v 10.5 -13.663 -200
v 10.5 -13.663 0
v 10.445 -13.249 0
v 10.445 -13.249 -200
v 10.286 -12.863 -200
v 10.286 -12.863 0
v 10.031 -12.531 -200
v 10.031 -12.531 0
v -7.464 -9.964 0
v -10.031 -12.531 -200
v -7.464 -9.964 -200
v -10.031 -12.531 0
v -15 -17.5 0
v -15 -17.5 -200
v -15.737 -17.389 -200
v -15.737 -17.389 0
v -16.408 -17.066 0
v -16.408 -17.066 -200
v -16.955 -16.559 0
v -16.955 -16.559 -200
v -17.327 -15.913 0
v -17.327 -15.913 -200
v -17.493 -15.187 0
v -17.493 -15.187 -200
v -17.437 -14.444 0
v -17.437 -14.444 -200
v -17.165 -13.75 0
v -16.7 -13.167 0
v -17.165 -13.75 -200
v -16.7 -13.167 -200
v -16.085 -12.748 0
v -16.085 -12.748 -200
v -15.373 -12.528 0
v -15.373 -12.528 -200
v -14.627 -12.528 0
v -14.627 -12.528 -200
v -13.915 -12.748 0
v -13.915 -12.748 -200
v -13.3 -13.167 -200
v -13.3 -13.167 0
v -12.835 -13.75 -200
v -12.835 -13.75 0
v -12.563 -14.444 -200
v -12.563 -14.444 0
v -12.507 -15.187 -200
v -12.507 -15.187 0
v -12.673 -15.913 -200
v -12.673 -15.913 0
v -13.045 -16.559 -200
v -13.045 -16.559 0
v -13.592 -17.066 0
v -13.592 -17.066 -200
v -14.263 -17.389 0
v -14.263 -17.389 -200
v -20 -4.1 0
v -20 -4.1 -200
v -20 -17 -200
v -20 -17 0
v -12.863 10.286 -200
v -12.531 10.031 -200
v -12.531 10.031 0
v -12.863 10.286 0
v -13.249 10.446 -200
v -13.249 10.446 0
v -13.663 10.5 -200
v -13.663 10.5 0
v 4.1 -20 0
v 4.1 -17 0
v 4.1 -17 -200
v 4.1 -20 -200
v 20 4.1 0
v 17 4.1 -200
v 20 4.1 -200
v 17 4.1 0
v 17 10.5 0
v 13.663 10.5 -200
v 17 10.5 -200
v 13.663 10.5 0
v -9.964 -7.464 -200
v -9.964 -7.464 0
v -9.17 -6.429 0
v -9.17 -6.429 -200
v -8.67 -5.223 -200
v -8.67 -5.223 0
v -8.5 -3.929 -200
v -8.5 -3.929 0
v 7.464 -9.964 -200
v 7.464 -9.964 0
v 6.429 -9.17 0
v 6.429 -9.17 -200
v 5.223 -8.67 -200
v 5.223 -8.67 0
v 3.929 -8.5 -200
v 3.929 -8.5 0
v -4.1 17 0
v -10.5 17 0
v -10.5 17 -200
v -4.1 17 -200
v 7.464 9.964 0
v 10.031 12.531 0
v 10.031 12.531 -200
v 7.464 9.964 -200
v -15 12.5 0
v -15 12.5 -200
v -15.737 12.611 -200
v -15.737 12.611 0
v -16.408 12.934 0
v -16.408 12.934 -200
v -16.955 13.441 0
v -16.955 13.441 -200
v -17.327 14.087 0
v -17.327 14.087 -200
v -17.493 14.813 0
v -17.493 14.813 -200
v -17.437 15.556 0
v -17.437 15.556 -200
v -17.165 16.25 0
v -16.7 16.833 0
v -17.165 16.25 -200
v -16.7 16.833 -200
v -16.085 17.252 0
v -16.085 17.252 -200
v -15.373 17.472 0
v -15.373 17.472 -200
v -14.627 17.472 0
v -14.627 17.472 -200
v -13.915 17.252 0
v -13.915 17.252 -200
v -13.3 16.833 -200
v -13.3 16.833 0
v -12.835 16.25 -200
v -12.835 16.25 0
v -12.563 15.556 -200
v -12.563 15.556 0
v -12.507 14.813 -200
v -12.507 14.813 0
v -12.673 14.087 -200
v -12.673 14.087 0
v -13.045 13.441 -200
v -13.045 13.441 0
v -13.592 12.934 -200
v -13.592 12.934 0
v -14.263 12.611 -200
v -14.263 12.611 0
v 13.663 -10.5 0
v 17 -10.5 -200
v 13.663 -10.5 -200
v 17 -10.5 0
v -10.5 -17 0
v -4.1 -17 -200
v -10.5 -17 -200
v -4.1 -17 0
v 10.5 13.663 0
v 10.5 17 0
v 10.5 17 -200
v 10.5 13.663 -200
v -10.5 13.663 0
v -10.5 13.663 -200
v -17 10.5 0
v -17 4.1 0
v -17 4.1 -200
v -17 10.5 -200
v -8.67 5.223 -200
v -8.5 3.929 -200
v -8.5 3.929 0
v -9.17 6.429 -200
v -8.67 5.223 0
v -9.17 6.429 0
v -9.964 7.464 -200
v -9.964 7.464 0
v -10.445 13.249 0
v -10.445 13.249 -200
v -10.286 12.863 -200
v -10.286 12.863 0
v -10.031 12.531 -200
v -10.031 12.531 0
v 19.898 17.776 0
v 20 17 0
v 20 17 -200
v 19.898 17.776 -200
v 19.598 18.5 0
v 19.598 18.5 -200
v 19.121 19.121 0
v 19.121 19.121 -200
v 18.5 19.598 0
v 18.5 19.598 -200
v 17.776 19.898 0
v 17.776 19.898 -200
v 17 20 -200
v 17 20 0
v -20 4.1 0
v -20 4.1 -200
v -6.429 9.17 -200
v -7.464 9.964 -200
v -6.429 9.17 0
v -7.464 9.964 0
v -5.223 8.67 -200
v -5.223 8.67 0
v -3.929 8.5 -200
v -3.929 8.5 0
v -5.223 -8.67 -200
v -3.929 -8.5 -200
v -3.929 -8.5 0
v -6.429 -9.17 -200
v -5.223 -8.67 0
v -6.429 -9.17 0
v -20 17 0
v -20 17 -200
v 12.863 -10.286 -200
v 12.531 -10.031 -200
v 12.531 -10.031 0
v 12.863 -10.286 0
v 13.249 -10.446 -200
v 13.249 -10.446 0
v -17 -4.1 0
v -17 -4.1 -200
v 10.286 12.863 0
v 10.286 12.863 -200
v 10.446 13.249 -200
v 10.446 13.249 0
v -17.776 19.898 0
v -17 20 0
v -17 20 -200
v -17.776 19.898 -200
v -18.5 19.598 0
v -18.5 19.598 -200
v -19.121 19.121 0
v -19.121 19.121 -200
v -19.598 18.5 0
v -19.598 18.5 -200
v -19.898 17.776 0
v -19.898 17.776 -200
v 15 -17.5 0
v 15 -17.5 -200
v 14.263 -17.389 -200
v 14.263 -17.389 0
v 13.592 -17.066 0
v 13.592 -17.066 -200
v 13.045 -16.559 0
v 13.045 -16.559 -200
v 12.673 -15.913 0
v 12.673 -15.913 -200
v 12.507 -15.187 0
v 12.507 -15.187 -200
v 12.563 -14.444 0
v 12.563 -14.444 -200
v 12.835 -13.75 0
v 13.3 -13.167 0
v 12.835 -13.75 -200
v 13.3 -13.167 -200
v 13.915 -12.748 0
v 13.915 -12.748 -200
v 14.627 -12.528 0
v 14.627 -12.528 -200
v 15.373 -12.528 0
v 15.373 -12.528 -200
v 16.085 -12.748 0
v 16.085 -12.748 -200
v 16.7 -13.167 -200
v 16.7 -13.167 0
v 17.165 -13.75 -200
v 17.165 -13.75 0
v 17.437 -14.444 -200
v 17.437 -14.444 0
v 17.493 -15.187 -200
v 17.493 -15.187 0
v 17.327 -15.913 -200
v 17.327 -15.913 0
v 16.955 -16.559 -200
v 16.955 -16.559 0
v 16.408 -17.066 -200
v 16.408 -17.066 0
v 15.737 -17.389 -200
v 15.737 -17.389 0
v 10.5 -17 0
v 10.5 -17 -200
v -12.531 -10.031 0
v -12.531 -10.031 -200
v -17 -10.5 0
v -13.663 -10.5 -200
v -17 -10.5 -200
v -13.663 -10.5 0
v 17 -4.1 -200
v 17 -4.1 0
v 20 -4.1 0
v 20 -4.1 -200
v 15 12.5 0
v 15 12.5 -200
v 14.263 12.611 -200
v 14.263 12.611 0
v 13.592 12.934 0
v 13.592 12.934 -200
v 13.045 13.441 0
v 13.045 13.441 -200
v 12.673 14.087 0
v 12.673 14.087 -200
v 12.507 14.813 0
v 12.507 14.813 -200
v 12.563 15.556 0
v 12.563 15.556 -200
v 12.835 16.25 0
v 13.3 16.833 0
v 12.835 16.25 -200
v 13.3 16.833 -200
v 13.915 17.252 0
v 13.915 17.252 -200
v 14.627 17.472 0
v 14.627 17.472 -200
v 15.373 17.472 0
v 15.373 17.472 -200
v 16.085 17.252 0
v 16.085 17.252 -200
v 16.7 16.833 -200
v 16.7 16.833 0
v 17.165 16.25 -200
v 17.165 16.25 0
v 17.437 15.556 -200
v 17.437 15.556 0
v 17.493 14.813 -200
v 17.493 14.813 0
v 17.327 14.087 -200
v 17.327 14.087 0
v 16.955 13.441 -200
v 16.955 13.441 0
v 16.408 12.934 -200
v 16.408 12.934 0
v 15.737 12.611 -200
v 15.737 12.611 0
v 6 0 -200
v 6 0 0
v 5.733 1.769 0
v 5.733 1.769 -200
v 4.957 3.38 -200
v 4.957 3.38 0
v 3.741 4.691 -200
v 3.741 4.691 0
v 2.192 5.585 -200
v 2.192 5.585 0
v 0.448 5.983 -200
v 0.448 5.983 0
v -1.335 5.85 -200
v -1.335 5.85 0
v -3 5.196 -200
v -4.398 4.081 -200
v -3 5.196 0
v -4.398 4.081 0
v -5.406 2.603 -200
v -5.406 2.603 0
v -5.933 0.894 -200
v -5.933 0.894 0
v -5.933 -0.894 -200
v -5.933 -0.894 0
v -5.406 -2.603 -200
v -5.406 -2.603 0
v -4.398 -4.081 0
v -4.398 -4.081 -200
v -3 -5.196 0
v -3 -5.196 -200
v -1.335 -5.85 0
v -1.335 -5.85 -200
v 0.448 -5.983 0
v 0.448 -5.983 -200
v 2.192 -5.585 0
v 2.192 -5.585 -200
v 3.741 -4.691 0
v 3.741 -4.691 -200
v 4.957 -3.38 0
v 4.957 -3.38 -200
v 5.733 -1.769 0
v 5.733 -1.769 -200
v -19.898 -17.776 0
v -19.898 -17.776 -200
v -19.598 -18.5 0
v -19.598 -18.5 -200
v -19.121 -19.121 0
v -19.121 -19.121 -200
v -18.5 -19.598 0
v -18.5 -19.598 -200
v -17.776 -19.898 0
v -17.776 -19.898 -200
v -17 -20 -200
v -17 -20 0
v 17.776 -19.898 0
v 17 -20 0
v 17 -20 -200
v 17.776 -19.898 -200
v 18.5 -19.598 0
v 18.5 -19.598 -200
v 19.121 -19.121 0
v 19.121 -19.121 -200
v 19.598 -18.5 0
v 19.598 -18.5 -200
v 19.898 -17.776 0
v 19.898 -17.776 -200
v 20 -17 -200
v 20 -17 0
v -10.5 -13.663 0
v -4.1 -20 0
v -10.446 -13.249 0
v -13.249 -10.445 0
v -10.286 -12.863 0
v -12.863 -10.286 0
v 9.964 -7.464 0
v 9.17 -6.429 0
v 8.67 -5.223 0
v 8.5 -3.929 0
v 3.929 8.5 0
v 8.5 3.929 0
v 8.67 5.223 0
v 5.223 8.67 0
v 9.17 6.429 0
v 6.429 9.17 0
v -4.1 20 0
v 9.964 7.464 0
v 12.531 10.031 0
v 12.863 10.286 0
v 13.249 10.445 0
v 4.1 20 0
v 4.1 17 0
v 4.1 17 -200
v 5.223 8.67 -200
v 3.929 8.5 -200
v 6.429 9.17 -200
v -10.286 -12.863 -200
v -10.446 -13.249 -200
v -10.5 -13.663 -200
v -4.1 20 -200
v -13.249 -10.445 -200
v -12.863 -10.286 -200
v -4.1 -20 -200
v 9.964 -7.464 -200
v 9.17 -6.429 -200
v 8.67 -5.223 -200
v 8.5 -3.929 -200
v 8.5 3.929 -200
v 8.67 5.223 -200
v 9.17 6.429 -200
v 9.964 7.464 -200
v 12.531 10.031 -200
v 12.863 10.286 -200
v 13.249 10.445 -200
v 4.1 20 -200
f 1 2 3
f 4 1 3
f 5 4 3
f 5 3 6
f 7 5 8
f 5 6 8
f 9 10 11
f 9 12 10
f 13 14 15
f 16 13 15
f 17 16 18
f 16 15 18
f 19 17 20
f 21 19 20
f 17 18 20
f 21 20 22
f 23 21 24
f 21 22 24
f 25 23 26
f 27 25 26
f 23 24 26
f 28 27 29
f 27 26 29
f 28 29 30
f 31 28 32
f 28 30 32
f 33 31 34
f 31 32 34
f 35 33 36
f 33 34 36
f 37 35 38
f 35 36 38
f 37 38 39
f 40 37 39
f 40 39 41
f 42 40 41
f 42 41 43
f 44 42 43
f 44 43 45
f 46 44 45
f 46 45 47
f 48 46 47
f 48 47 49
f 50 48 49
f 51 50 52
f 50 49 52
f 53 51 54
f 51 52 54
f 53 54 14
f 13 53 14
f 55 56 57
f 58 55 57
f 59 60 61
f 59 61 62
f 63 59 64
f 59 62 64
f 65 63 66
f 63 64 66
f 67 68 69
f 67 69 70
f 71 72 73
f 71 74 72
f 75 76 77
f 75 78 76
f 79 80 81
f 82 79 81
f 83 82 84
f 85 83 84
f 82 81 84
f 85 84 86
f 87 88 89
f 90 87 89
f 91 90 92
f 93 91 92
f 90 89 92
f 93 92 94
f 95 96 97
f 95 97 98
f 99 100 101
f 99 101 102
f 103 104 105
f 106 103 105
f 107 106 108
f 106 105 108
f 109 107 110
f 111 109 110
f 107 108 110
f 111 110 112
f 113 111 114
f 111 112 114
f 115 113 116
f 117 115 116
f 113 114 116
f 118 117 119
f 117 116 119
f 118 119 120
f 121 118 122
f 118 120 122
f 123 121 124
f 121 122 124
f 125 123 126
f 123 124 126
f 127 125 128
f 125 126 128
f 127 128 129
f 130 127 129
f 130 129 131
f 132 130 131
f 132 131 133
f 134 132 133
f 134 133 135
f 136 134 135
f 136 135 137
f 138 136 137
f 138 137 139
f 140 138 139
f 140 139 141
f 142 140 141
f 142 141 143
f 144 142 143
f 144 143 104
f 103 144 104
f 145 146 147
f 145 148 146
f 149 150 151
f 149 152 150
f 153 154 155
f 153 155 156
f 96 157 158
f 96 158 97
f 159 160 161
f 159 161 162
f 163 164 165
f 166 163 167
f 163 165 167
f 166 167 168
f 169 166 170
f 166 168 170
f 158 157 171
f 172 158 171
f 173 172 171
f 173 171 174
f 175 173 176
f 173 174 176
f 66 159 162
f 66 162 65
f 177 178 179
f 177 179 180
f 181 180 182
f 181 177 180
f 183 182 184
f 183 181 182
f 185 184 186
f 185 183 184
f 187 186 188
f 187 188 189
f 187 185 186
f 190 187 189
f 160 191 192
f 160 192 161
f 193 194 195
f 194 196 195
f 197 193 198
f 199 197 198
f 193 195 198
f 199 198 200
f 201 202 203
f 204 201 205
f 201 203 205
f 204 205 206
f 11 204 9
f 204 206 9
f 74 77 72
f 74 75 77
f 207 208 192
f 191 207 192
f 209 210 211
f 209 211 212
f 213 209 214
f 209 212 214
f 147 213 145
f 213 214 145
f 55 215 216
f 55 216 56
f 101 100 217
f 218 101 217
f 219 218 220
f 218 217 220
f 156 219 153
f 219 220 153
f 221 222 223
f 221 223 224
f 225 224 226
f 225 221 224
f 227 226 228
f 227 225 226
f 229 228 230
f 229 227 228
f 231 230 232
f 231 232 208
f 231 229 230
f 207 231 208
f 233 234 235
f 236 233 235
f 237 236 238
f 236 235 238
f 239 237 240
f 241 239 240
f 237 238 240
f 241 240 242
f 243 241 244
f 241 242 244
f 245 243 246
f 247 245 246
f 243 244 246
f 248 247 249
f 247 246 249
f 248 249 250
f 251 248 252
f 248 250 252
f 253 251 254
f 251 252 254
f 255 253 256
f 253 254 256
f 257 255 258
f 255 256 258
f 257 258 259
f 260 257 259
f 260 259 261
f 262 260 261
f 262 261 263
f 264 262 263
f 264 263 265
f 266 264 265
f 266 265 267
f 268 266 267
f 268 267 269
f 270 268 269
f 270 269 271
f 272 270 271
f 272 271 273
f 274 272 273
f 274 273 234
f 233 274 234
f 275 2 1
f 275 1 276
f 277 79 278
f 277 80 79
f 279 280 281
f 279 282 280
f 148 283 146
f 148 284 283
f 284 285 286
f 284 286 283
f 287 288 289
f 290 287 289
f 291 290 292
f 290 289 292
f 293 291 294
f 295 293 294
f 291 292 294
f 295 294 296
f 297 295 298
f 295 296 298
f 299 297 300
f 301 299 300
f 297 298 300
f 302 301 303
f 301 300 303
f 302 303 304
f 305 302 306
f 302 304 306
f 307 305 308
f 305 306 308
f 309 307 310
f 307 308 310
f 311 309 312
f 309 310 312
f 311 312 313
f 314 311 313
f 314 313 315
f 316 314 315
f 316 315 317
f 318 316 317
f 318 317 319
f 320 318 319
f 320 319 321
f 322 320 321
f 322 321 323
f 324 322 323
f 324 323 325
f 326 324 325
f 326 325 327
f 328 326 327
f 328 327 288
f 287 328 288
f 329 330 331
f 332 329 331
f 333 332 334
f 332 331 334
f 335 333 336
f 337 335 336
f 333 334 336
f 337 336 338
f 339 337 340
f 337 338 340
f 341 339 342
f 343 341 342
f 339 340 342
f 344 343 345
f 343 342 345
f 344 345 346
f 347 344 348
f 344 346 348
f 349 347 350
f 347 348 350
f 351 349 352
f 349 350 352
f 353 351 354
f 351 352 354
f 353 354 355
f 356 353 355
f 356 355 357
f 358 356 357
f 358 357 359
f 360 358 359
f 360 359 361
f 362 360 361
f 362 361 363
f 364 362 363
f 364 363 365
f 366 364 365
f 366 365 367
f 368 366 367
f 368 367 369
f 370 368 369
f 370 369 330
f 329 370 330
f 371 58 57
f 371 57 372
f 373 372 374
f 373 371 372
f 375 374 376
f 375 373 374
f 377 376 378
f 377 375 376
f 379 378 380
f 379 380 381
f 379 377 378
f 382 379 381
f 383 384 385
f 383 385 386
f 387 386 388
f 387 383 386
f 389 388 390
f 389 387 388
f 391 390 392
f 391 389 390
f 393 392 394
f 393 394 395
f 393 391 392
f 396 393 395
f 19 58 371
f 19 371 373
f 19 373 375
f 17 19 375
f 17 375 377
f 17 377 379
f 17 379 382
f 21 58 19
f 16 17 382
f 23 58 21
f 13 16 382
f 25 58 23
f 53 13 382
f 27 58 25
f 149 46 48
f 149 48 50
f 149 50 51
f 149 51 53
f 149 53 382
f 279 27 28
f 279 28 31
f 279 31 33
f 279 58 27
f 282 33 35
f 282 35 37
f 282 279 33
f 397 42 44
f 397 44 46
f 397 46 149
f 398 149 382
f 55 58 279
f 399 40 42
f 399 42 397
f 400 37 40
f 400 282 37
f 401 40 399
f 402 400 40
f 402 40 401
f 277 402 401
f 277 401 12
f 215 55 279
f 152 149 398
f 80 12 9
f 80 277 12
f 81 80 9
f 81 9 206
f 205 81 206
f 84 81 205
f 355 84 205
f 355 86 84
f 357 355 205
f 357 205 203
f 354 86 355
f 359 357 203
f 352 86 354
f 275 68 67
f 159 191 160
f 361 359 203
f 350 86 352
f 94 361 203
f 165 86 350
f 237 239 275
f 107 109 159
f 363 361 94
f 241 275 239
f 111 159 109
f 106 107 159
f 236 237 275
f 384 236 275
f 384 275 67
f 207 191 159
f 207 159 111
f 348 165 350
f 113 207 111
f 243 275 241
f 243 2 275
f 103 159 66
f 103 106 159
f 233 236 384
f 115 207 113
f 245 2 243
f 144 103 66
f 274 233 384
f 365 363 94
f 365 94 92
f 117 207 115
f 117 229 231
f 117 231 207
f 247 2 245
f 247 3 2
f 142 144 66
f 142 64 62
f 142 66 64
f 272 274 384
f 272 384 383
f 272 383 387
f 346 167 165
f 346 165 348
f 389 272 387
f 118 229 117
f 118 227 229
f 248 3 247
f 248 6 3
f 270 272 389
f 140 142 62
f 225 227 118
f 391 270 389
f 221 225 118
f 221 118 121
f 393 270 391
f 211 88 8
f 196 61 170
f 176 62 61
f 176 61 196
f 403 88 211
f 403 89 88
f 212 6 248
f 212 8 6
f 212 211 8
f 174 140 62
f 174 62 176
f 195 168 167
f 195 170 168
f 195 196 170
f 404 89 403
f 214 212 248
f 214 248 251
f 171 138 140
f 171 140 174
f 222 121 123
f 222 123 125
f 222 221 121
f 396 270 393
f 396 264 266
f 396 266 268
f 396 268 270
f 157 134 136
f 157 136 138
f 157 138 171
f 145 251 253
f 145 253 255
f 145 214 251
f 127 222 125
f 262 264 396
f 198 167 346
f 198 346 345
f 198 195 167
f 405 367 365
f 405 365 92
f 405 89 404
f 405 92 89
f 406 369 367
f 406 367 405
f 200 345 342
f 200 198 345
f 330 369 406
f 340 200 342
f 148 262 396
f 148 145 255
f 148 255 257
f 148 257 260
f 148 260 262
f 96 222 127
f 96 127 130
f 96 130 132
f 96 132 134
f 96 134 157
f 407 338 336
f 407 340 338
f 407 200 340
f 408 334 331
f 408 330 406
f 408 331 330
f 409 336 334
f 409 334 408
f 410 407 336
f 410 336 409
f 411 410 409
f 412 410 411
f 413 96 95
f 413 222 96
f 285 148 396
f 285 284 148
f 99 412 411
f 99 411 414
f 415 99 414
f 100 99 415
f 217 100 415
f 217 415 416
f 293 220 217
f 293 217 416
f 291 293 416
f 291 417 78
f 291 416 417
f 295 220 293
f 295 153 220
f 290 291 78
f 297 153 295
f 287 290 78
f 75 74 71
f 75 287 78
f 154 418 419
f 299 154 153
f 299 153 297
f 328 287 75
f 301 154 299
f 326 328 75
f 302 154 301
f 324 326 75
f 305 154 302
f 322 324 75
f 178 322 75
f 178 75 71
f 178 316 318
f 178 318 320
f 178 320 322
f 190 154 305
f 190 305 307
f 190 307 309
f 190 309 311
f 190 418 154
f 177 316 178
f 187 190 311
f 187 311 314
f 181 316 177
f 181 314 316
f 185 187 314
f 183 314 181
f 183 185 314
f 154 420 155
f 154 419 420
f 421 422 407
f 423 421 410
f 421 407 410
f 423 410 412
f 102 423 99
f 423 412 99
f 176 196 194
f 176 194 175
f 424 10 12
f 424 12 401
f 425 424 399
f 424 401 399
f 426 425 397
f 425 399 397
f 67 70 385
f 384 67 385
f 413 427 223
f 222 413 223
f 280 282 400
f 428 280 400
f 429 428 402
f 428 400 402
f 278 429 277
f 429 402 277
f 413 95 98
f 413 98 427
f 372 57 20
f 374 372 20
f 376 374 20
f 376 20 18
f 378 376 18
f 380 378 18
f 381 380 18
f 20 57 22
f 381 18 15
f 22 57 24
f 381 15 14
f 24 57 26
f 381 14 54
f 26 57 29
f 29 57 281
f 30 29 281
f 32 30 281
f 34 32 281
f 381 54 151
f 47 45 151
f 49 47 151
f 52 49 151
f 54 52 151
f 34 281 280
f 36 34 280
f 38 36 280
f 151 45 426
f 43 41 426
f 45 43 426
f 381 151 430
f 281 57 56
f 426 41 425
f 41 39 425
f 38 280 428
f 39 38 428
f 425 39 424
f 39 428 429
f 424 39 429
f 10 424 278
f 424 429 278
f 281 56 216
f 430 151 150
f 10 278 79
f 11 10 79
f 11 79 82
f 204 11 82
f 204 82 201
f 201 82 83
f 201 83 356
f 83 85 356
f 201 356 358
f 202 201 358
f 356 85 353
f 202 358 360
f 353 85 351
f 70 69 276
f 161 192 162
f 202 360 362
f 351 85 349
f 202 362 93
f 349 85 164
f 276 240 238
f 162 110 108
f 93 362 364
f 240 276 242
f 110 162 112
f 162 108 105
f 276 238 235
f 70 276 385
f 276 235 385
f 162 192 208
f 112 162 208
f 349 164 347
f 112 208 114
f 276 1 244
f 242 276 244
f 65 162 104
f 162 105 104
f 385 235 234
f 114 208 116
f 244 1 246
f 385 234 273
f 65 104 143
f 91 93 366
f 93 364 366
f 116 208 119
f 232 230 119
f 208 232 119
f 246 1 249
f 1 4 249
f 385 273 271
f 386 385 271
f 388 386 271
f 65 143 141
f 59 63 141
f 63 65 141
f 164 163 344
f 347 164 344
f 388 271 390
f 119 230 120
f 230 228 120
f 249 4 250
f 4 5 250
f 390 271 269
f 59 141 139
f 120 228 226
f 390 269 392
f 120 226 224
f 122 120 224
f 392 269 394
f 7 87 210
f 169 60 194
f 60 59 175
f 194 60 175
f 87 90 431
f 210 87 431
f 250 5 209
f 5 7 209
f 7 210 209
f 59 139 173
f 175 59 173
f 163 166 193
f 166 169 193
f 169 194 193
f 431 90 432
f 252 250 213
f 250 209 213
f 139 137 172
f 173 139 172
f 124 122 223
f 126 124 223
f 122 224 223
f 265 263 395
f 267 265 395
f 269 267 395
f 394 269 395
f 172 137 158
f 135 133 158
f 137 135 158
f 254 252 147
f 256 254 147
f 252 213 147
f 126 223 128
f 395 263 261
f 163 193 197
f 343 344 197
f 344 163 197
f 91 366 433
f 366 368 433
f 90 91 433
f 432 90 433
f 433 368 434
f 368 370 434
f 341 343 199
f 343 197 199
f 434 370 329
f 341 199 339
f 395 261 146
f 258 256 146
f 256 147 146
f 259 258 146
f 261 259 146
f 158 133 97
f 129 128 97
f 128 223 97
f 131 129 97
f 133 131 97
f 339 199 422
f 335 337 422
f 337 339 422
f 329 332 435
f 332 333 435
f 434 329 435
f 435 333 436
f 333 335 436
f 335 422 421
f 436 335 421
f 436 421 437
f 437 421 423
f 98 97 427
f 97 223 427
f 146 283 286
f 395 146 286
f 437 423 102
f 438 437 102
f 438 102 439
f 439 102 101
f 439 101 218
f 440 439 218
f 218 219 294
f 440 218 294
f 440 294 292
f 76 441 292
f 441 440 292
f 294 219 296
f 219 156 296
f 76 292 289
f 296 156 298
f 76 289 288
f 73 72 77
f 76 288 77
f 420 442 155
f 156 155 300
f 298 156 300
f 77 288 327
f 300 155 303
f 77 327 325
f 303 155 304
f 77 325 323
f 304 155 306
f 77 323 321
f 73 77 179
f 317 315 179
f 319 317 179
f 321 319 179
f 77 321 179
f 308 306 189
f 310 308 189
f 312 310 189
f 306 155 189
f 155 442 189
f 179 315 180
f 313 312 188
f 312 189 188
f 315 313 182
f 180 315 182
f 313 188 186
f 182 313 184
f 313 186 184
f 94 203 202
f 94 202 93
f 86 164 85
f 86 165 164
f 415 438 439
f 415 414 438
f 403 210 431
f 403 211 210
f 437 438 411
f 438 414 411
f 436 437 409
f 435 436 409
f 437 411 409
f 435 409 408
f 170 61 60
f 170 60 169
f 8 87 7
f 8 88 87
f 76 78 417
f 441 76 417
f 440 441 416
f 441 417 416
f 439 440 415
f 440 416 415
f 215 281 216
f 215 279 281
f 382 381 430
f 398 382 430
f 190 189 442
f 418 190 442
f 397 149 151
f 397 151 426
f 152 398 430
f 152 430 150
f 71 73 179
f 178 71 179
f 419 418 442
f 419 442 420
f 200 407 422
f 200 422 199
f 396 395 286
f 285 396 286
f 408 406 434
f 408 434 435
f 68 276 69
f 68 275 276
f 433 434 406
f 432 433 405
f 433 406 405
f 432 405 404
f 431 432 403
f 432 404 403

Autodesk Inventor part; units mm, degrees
sketch "Skizze_1" plane through (0, 0, 0) normal (0, 0, 1) x (1, 0, 0)
  arc A0 (-20, -17) -> (-17, -20) centre (-17, -17) ccw
  line L0 (-17, -20) -> (-4.1, -20)
  line L1 (-4.1, -20) -> (-4.1, -17)
  line L2 (-4.1, -17) -> (-10.5, -17)
  line L3 (-10.5, -17) -> (-10.5, -13.6627)
  arc A1 (-10.0314, -12.5314) -> (-10.5, -13.6627) centre (-8.9002, -13.6627) ccw
  line L4 (-10.0314, -12.5314) -> (-7.4645, -9.9645)
  arc A2 (-3.9289, -8.5) -> (-7.4645, -9.9645) centre (-3.9289, -13.5) ccw
  line L5 (-3.9289, -8.5) -> (3.9289, -8.5)
  arc A3 (7.4645, -9.9645) -> (3.9289, -8.5) centre (3.9289, -13.5) ccw
  line L6 (7.4645, -9.9645) -> (10.0314, -12.5314)
  arc A4 (10.5, -13.6627) -> (10.0314, -12.5314) centre (8.9002, -13.6627) ccw
  line L7 (10.5, -13.6627) -> (10.5, -17)
  line L8 (10.5, -17) -> (4.1, -17)
  line L9 (4.1, -17) -> (4.1, -20)
  line L10 (4.1, -20) -> (17, -20)
  arc A5 (17, -20) -> (20, -17) centre (17, -17) ccw
  line L11 (20, -17) -> (20, -4.1)
  line L12 (20, -4.1) -> (17, -4.1)
  line L13 (17, -4.1) -> (17, -10.5)
  line L14 (17, -10.5) -> (13.6627, -10.5)
  arc A6 (12.5314, -10.0314) -> (13.6627, -10.5) centre (13.6627, -8.9002) ccw
  line L15 (12.5314, -10.0314) -> (9.9645, -7.4645)
  arc A7 (8.5, -3.9289) -> (9.9645, -7.4645) centre (13.5, -3.9289) ccw
  line L16 (8.5, -3.9289) -> (8.5, 3.9289)
  arc A8 (9.9645, 7.4645) -> (8.5, 3.9289) centre (13.5, 3.9289) ccw
  line L17 (9.9645, 7.4645) -> (12.5314, 10.0314)
  arc A9 (13.6627, 10.5) -> (12.5314, 10.0314) centre (13.6627, 8.9002) ccw
  line L18 (13.6627, 10.5) -> (17, 10.5)
  line L19 (17, 10.5) -> (17, 4.1)
  line L20 (17, 4.1) -> (20, 4.1)
  line L21 (20, 4.1) -> (20, 17)
  arc A10 (20, 17) -> (17, 20) centre (17, 17) ccw
  line L22 (17, 20) -> (4.1, 20)
  line L23 (4.1, 20) -> (4.1, 17)
  line L24 (4.1, 17) -> (10.5, 17)
  line L25 (10.5, 17) -> (10.5, 13.6627)
  arc A11 (10.0314, 12.5314) -> (10.5, 13.6627) centre (8.9002, 13.6627) ccw
  line L26 (10.0314, 12.5314) -> (7.4645, 9.9645)
  arc A12 (3.9289, 8.5) -> (7.4645, 9.9645) centre (3.9289, 13.5) ccw
  line L27 (3.9289, 8.5) -> (-3.9289, 8.5)
  arc A13 (-7.4645, 9.9645) -> (-3.9289, 8.5) centre (-3.9289, 13.5) ccw
  line L28 (-7.4645, 9.9645) -> (-10.0314, 12.5314)
  arc A14 (-10.5, 13.6627) -> (-10.0314, 12.5314) centre (-8.9002, 13.6627) ccw
  line L29 (-10.5, 13.6627) -> (-10.5, 17)
  line L30 (-10.5, 17) -> (-4.1, 17)
  line L31 (-4.1, 17) -> (-4.1, 20)
  line L32 (-4.1, 20) -> (-17, 20)
  arc A15 (-17, 20) -> (-20, 17) centre (-17, 17) ccw
  line L33 (-20, 17) -> (-20, 4.1)
  line L34 (-20, 4.1) -> (-17, 4.1)
  line L35 (-17, 4.1) -> (-17, 10.5)
  line L36 (-17, 10.5) -> (-13.6627, 10.5)
  arc A16 (-12.5314, 10.0314) -> (-13.6627, 10.5) centre (-13.6627, 8.9002) ccw
  line L37 (-12.5314, 10.0314) -> (-9.9645, 7.4645)
  arc A17 (-8.5, 3.9289) -> (-9.9645, 7.4645) centre (-13.5, 3.9289) ccw
  line L38 (-8.5, 3.9289) -> (-8.5, -3.9289)
  arc A18 (-9.9645, -7.4645) -> (-8.5, -3.9289) centre (-13.5, -3.9289) ccw
  line L39 (-9.9645, -7.4645) -> (-12.5314, -10.0314)
  arc A19 (-13.6627, -10.5) -> (-12.5314, -10.0314) centre (-13.6627, -8.9002) ccw
  line L40 (-13.6627, -10.5) -> (-17, -10.5)
  line L41 (-17, -10.5) -> (-17, -4.1)
  line L42 (-17, -4.1) -> (-20, -4.1)
  line L43 (-20, -4.1) -> (-20, -17)
  circle A20 centre (0, 0) radius 6
extrude "Extrusion1" add sketch "Skizze_1" against normal blind 200
sketch "Sketch2" plane through (0, 0, 0) normal (0, 0, 1) x (1, 0, 0)
  point P0 (-15, -15)
hole "Drilling 1" at (-15, -15, 0) direction (0, 0, -1) diameter 5 depth 6000
sketch "Sketch3" plane through (0, 0, 0) normal (0, 0, 1) x (1, 0, 0)
  point P0 (15, -15)
hole "Drilling 2" at (15, -15, 0) direction (0, 0, -1) diameter 5 depth 6000
sketch "Sketch4" plane through (0, 0, 0) normal (0, 0, 1) x (1, 0, 0)
  point P0 (15, 15)
hole "Drilling 3" at (15, 15, 0) direction (0, 0, -1) diameter 5 depth 6000
sketch "Sketch5" plane through (0, 0, 0) normal (0, 0, 1) x (1, 0, 0)
  point P0 (-15, 15)
hole "Drilling 4" at (-15, 15, 0) direction (0, 0, -1) diameter 5 depth 6000
ref_plane "side_4d_XY" through (-20, 0, -330) normal (-1, 0, 0) x (0, 1, 0)
ref_plane "side_4d_YZ" through (-20, 0, -330) normal (0, 1, 0) x (0, 0, -1)
ref_plane "side_4d_ZX" through (-20, 0, -330) normal (0, 0, -1) x (-1, 0, 0)
ref_plane "side_1a_XY" through (0, 20, -330) normal (0, 1, 0) x (1, 0, 0)
ref_plane "side_1a_YZ" through (0, 20, -330) normal (1, 0, 0) x (0, 0, -1)
ref_plane "side_1a_ZX" through (0, 20, -330) normal (0, 0, -1) x (0, 1, 0)
ref_plane "side_2b_XY" through (20, 0, -330) normal (1, 0, 0) x (0, -1, 0)
ref_plane "side_2b_YZ" through (20, 0, -330) normal (0, -1, 0) x (0, 0, -1)
ref_plane "side_2b_ZX" through (20, 0, -330) normal (0, 0, -1) x (1, 0, 0)
ref_plane "side_3c_XY" through (0, -20, -330) normal (0, -1, 0) x (-1, 0, 0)
ref_plane "side_3c_YZ" through (0, -20, -330) normal (-1, 0, 0) x (0, 0, -1)
ref_plane "side_3c_ZX" through (0, -20, -330) normal (0, 0, -1) x (0, -1, 0)
ref_plane "end_XY" through (0, 0, -660) normal (0, 0, -1) x (1, 0, 0)
ref_plane "end_YZ" through (0, 0, -660) normal (1, 0, 0) x (0, -1, 0)
ref_plane "end_ZX" through (0, 0, -660) normal (0, -1, 0) x (0, 0, -1)
ref_plane "start_XY" through (0, 0, 0) normal (0, 0, 1) x (1, 0, 0)
ref_plane "start_YZ" through (0, 0, 0) normal (1, 0, 0) x (0, 1, 0)
ref_plane "start_ZX" through (0, 0, 0) normal (0, 1, 0) x (0, 0, 1)
properties part number "MayTec 1.11.040040.43S_Profile 40x40, 4E, S_660_Detail_(0;0,0,0)"
